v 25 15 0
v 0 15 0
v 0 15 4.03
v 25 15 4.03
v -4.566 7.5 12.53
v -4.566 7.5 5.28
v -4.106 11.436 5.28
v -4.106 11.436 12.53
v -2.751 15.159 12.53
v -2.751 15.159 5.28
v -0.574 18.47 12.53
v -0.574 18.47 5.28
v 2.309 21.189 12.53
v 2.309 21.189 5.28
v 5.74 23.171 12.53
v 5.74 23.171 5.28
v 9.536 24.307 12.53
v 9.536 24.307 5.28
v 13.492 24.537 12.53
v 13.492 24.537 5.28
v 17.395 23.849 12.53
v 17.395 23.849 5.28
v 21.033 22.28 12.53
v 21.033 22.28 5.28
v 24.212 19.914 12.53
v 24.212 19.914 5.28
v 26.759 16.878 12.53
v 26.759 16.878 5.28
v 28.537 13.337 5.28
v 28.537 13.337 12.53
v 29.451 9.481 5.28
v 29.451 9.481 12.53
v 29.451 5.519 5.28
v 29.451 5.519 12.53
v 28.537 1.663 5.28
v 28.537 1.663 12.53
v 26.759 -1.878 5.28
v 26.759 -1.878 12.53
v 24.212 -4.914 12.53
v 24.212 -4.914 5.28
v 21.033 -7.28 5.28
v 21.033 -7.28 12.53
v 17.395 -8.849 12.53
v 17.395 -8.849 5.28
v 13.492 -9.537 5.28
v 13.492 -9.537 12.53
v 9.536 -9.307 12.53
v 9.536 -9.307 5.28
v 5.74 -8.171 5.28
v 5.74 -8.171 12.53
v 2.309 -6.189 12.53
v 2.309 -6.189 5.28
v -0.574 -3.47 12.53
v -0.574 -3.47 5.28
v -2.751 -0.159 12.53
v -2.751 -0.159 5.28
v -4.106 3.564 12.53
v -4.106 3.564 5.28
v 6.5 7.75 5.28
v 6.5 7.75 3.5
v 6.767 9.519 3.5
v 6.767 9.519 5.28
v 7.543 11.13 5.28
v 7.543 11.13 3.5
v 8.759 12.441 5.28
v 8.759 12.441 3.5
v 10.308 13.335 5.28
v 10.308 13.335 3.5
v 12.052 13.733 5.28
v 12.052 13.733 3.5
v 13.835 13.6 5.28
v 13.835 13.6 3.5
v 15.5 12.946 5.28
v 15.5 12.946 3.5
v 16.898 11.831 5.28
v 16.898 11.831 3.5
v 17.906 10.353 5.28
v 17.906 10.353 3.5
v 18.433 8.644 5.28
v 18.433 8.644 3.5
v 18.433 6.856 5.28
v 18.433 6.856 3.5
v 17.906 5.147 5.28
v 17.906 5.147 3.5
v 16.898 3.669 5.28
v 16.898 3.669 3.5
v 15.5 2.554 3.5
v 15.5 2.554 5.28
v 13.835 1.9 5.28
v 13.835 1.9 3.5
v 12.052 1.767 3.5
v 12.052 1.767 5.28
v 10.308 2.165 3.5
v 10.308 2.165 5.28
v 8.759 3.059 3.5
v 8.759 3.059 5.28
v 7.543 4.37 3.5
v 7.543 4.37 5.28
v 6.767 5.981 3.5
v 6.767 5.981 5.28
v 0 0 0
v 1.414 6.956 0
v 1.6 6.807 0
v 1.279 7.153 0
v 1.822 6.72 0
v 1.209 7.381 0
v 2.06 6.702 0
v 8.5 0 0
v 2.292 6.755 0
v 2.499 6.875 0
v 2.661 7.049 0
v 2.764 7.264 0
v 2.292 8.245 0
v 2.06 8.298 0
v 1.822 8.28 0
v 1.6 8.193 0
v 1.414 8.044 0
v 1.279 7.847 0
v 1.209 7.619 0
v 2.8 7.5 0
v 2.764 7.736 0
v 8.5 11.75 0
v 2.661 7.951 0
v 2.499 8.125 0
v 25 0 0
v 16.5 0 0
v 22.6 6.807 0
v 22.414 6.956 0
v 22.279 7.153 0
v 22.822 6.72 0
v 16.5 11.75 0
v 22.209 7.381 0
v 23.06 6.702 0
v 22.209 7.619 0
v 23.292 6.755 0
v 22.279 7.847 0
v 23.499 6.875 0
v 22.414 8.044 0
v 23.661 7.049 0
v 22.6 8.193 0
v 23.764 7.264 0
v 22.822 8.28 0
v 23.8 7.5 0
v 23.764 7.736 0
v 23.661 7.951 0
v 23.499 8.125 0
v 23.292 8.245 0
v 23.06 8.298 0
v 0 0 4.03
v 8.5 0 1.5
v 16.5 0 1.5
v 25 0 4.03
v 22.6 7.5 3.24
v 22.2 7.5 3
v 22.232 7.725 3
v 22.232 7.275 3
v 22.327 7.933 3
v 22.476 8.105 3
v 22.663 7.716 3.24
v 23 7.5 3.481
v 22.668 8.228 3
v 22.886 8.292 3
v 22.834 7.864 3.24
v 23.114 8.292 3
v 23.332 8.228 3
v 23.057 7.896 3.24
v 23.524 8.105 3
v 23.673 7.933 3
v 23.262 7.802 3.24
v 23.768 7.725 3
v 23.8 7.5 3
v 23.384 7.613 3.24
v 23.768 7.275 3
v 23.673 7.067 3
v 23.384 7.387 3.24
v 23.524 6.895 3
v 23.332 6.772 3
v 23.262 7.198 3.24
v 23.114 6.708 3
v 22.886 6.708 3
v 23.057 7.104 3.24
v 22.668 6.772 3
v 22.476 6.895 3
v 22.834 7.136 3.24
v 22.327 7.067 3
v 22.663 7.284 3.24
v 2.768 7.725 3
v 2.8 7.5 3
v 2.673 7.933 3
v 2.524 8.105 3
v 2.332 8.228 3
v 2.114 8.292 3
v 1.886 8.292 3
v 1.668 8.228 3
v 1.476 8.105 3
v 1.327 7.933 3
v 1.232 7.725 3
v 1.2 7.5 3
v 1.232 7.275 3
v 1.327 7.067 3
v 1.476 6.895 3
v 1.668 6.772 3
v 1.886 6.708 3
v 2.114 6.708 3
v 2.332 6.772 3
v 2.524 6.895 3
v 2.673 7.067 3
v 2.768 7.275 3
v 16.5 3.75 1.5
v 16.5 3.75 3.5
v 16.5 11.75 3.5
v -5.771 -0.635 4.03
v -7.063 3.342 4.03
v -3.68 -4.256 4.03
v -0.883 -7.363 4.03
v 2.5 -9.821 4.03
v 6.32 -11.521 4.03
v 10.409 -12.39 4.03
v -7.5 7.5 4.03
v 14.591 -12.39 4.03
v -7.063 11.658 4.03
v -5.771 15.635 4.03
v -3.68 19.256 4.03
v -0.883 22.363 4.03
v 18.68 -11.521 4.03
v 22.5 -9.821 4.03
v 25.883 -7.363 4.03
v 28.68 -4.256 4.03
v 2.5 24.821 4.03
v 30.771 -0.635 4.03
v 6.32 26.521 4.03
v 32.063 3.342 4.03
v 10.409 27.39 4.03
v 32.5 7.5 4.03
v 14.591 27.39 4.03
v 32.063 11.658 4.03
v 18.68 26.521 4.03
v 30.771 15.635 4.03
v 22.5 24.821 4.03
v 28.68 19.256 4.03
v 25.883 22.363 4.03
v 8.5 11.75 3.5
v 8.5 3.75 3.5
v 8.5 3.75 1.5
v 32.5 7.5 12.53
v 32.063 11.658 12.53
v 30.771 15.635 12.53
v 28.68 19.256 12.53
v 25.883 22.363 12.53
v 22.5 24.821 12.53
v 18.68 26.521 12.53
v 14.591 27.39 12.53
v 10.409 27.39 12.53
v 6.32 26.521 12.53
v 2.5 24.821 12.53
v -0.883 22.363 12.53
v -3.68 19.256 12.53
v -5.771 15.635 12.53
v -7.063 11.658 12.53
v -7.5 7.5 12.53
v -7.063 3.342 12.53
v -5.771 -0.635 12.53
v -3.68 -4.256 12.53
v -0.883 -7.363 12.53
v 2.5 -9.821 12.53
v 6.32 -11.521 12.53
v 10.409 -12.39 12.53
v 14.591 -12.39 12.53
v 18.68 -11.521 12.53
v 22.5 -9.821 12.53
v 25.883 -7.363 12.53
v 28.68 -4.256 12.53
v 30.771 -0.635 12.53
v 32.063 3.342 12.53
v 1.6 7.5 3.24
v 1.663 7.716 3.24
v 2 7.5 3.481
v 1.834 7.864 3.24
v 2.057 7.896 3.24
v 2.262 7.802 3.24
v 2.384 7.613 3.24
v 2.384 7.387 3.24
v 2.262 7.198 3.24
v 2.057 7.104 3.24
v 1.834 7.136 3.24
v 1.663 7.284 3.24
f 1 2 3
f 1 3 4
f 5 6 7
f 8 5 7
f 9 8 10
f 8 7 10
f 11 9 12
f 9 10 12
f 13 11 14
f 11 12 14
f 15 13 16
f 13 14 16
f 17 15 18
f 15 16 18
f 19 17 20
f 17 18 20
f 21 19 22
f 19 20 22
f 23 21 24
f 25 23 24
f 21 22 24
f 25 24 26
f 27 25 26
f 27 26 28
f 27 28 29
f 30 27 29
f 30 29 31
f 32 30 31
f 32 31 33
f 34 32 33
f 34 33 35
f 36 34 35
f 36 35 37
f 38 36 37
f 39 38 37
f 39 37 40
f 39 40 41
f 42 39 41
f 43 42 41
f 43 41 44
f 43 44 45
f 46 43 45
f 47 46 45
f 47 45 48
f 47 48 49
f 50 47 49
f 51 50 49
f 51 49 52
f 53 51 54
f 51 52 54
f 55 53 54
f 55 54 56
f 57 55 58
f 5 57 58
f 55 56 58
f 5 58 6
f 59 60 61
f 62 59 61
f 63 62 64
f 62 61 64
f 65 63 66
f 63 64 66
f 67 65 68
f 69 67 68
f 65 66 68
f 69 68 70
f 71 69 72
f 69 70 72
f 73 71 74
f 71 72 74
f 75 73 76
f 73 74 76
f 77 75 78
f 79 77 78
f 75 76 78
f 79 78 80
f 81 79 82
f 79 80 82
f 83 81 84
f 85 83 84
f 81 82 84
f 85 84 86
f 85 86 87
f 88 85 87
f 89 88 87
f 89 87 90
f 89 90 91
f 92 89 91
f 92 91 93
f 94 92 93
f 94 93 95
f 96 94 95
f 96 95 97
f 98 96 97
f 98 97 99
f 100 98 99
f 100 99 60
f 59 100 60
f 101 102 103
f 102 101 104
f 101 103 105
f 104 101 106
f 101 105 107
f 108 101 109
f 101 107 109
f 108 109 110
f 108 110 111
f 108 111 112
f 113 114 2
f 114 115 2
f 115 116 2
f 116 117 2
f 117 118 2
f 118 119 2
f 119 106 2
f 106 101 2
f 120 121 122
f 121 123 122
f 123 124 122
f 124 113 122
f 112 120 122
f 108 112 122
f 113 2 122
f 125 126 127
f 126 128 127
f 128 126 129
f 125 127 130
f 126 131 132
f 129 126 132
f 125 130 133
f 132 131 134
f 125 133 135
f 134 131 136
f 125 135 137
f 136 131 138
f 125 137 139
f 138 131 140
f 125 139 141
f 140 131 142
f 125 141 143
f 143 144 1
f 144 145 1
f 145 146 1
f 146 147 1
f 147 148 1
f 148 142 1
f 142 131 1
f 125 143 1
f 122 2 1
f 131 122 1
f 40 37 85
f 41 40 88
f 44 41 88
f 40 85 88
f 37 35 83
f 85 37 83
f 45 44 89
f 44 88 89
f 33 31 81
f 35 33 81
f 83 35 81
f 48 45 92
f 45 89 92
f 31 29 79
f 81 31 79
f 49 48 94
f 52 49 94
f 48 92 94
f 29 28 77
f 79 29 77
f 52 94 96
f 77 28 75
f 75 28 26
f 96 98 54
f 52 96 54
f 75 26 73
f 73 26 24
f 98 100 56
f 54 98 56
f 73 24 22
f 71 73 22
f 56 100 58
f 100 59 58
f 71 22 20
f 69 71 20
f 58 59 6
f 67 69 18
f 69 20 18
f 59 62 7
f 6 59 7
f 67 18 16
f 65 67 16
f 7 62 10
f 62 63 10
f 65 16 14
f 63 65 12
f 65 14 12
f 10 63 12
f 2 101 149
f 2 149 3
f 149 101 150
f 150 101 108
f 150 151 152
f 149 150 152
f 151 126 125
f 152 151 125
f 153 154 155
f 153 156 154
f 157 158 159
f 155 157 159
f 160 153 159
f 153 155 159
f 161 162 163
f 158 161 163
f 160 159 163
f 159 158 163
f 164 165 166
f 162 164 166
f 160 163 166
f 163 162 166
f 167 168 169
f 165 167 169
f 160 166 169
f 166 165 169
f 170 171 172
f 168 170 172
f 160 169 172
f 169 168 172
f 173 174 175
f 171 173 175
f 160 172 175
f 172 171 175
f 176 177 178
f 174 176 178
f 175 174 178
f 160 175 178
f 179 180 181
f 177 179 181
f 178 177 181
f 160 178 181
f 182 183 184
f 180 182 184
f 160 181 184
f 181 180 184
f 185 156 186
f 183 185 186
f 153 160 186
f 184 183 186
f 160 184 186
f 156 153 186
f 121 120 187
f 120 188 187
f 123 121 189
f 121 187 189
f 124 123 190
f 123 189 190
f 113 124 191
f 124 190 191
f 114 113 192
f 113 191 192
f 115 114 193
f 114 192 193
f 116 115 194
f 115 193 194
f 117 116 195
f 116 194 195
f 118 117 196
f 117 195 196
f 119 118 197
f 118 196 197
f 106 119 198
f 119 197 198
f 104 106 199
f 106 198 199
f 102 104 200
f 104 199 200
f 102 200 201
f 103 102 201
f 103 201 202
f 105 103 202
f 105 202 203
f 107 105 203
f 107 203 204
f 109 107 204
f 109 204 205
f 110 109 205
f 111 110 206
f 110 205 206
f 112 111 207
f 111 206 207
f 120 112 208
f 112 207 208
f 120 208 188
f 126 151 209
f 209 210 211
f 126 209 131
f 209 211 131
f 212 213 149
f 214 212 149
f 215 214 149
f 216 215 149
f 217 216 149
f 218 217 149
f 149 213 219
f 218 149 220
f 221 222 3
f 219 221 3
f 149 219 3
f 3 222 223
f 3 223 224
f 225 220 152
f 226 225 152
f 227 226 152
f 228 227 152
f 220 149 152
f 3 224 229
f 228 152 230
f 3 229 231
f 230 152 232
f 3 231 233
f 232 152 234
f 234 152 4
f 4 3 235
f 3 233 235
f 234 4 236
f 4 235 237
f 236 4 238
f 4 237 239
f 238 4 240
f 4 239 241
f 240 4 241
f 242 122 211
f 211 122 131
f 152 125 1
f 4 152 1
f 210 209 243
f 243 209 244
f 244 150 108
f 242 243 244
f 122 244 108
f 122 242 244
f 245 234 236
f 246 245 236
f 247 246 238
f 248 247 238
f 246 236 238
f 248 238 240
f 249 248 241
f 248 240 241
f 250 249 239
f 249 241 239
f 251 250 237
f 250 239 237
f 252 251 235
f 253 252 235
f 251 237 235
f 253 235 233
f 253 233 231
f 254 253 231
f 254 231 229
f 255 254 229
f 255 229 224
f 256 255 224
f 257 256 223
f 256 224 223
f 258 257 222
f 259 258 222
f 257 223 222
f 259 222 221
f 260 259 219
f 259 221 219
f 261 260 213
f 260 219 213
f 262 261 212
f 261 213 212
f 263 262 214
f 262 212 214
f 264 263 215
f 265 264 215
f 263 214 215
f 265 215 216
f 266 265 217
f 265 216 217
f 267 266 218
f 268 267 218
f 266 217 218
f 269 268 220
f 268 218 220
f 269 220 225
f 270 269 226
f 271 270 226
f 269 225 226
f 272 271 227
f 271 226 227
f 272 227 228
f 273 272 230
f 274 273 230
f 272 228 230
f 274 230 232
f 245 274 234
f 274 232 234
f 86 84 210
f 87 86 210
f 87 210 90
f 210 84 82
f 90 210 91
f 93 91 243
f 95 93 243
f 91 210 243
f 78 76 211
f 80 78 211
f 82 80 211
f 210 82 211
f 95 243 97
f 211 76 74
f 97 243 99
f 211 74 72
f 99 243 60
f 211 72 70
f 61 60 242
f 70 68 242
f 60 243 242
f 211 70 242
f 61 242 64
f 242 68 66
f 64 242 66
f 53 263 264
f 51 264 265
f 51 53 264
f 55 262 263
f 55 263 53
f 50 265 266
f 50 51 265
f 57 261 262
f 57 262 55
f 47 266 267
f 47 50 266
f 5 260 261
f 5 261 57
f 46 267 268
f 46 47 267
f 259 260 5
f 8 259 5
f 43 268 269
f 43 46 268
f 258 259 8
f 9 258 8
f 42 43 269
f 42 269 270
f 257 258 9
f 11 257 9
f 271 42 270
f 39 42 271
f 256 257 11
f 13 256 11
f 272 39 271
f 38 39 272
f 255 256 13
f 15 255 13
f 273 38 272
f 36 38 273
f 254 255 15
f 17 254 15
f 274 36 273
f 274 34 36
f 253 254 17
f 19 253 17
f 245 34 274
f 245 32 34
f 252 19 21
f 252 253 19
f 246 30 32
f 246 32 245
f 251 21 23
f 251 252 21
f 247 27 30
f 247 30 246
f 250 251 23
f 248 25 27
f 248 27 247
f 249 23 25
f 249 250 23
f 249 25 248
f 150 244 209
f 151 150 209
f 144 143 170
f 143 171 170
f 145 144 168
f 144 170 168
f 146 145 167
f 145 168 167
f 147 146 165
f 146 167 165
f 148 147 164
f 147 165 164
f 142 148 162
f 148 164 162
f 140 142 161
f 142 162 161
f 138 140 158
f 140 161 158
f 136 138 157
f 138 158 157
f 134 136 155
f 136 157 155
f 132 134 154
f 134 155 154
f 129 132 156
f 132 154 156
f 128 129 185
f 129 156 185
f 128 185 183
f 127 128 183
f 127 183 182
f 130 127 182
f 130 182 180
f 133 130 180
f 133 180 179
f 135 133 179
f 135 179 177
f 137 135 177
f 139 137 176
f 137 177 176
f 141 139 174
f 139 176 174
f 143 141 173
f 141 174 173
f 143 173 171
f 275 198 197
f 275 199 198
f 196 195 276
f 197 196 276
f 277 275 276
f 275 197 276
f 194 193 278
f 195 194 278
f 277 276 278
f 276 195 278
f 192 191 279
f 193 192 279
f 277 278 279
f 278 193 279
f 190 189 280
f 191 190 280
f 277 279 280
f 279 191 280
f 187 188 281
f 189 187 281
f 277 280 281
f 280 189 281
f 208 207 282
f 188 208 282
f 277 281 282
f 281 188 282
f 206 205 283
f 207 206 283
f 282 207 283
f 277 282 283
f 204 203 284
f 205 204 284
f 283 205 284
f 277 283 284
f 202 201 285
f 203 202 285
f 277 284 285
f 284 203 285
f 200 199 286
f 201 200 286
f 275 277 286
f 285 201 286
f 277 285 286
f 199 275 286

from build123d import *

# Parameters (mm, degrees)
SKETCH1_W                    = 25
SKETCH1_H                    = 15
BOSS_EXTRUDE1_DEPTH          = 4.03
M2_TAPPED_HOLE1_D            = 1.6
M2_TAPPED_HOLE1_DEPTH        = 3
M2_TAPPED_HOLE1_TIP          = 0.480688495
SKETCH5_R                    = 20
BOSS_EXTRUDE2_DEPTH          = 8.5
SKETCH6_R                    = 12.25
CUT_EXTRUDE1_DEPTH           = 5.25
F_1_1_2_6_TAPPED_HOLE1_D     = 34.13252
F_1_1_2_6_TAPPED_HOLE1_DEPTH = 7.25
CUT_EXTRUDE2_DEPTH           = 3.5
SKETCH14_W                   = 8
SKETCH14_H                   = 1.5
CUT_EXTRUDE3_DEPTH           = 13.5
SKETCH15_R                   = 6
CUT_EXTRUDE4_DEPTH           = 13.5


with BuildPart() as part:
    # Sketch1 → Boss-Extrude1 (new body)
    with BuildSketch(Plane.XY):
        with Locations((12.5, 7.5)):
            Rectangle(SKETCH1_W, SKETCH1_H)
    extrude(amount=BOSS_EXTRUDE1_DEPTH)

    # M2 Tapped Hole1
    with Locations(Plane(origin=(0, 0, 0), x_dir=(-1, 0, 0), z_dir=(0, 0, -1))):
        with Locations((-23, 7.5), (-2, 7.5)):
            Hole(M2_TAPPED_HOLE1_D / 2, depth=M2_TAPPED_HOLE1_DEPTH)
            with Locations((0, 0, -(M2_TAPPED_HOLE1_DEPTH + M2_TAPPED_HOLE1_TIP / 2))):  # 118° drill point
                Cone(0, M2_TAPPED_HOLE1_D / 2, M2_TAPPED_HOLE1_TIP, mode=Mode.SUBTRACT)

    # Sketch5 → Boss-Extrude2 (add)
    with BuildSketch(Plane.XY.offset(4.03)):
        with Locations((12.5, 7.5)):
            Circle(SKETCH5_R)
    extrude(amount=BOSS_EXTRUDE2_DEPTH)

    # Sketch6 → Cut-Extrude1 (cut)
    with BuildSketch(Plane.XY.offset(12.53)):
        with Locations((12.5, 7.5)):
            Circle(SKETCH6_R)
    extrude(amount=-CUT_EXTRUDE1_DEPTH, mode=Mode.SUBTRACT)

    # 1-1/2-6 Tapped Hole1
    with Locations(Plane.XY.offset(12.53)):
        with Locations((12.5, 7.5)):
            Hole(F_1_1_2_6_TAPPED_HOLE1_D / 2, depth=F_1_1_2_6_TAPPED_HOLE1_DEPTH)

    # Sketch13 → Cut-Extrude2 (cut)
    with BuildSketch(Plane(origin=(0, 0, 0), x_dir=(-1, 0, 0), z_dir=(0, 0, -1))):
        Polygon((-12.5, 3.75), (-12.5, 7.5), (-12.5, 7.75), (-12.5, 11.75), (-16.5, 11.75), (-16.5, 3.75), align=None)
        Polygon((-12.5, 7.75), (-12.5, 7.5), (-12.5, 3.75), (-8.5, 3.75), (-8.5, 11.75), (-12.5, 11.75), align=None)
    extrude(amount=-CUT_EXTRUDE2_DEPTH, mode=Mode.SUBTRACT)

    # Sketch14 → Cut-Extrude3 (cut)
    with BuildSketch(Plane(origin=(0, 3.75, 0), x_dir=(1, 0, 0), z_dir=(0, 1, 0))):
        with Locations((12.5, -0.75)):
            Rectangle(SKETCH14_W, SKETCH14_H)
    extrude(amount=-CUT_EXTRUDE3_DEPTH, mode=Mode.SUBTRACT)

    # Sketch15 → Cut-Extrude4 (cut)
    with BuildSketch(Plane(origin=(0, 0, 3.5), x_dir=(-1, 0, 0), z_dir=(0, 0, -1))):
        with Locations((-12.5, 7.75)):
            Circle(SKETCH15_R)
    extrude(amount=-CUT_EXTRUDE4_DEPTH, mode=Mode.SUBTRACT)


solid = part.part
